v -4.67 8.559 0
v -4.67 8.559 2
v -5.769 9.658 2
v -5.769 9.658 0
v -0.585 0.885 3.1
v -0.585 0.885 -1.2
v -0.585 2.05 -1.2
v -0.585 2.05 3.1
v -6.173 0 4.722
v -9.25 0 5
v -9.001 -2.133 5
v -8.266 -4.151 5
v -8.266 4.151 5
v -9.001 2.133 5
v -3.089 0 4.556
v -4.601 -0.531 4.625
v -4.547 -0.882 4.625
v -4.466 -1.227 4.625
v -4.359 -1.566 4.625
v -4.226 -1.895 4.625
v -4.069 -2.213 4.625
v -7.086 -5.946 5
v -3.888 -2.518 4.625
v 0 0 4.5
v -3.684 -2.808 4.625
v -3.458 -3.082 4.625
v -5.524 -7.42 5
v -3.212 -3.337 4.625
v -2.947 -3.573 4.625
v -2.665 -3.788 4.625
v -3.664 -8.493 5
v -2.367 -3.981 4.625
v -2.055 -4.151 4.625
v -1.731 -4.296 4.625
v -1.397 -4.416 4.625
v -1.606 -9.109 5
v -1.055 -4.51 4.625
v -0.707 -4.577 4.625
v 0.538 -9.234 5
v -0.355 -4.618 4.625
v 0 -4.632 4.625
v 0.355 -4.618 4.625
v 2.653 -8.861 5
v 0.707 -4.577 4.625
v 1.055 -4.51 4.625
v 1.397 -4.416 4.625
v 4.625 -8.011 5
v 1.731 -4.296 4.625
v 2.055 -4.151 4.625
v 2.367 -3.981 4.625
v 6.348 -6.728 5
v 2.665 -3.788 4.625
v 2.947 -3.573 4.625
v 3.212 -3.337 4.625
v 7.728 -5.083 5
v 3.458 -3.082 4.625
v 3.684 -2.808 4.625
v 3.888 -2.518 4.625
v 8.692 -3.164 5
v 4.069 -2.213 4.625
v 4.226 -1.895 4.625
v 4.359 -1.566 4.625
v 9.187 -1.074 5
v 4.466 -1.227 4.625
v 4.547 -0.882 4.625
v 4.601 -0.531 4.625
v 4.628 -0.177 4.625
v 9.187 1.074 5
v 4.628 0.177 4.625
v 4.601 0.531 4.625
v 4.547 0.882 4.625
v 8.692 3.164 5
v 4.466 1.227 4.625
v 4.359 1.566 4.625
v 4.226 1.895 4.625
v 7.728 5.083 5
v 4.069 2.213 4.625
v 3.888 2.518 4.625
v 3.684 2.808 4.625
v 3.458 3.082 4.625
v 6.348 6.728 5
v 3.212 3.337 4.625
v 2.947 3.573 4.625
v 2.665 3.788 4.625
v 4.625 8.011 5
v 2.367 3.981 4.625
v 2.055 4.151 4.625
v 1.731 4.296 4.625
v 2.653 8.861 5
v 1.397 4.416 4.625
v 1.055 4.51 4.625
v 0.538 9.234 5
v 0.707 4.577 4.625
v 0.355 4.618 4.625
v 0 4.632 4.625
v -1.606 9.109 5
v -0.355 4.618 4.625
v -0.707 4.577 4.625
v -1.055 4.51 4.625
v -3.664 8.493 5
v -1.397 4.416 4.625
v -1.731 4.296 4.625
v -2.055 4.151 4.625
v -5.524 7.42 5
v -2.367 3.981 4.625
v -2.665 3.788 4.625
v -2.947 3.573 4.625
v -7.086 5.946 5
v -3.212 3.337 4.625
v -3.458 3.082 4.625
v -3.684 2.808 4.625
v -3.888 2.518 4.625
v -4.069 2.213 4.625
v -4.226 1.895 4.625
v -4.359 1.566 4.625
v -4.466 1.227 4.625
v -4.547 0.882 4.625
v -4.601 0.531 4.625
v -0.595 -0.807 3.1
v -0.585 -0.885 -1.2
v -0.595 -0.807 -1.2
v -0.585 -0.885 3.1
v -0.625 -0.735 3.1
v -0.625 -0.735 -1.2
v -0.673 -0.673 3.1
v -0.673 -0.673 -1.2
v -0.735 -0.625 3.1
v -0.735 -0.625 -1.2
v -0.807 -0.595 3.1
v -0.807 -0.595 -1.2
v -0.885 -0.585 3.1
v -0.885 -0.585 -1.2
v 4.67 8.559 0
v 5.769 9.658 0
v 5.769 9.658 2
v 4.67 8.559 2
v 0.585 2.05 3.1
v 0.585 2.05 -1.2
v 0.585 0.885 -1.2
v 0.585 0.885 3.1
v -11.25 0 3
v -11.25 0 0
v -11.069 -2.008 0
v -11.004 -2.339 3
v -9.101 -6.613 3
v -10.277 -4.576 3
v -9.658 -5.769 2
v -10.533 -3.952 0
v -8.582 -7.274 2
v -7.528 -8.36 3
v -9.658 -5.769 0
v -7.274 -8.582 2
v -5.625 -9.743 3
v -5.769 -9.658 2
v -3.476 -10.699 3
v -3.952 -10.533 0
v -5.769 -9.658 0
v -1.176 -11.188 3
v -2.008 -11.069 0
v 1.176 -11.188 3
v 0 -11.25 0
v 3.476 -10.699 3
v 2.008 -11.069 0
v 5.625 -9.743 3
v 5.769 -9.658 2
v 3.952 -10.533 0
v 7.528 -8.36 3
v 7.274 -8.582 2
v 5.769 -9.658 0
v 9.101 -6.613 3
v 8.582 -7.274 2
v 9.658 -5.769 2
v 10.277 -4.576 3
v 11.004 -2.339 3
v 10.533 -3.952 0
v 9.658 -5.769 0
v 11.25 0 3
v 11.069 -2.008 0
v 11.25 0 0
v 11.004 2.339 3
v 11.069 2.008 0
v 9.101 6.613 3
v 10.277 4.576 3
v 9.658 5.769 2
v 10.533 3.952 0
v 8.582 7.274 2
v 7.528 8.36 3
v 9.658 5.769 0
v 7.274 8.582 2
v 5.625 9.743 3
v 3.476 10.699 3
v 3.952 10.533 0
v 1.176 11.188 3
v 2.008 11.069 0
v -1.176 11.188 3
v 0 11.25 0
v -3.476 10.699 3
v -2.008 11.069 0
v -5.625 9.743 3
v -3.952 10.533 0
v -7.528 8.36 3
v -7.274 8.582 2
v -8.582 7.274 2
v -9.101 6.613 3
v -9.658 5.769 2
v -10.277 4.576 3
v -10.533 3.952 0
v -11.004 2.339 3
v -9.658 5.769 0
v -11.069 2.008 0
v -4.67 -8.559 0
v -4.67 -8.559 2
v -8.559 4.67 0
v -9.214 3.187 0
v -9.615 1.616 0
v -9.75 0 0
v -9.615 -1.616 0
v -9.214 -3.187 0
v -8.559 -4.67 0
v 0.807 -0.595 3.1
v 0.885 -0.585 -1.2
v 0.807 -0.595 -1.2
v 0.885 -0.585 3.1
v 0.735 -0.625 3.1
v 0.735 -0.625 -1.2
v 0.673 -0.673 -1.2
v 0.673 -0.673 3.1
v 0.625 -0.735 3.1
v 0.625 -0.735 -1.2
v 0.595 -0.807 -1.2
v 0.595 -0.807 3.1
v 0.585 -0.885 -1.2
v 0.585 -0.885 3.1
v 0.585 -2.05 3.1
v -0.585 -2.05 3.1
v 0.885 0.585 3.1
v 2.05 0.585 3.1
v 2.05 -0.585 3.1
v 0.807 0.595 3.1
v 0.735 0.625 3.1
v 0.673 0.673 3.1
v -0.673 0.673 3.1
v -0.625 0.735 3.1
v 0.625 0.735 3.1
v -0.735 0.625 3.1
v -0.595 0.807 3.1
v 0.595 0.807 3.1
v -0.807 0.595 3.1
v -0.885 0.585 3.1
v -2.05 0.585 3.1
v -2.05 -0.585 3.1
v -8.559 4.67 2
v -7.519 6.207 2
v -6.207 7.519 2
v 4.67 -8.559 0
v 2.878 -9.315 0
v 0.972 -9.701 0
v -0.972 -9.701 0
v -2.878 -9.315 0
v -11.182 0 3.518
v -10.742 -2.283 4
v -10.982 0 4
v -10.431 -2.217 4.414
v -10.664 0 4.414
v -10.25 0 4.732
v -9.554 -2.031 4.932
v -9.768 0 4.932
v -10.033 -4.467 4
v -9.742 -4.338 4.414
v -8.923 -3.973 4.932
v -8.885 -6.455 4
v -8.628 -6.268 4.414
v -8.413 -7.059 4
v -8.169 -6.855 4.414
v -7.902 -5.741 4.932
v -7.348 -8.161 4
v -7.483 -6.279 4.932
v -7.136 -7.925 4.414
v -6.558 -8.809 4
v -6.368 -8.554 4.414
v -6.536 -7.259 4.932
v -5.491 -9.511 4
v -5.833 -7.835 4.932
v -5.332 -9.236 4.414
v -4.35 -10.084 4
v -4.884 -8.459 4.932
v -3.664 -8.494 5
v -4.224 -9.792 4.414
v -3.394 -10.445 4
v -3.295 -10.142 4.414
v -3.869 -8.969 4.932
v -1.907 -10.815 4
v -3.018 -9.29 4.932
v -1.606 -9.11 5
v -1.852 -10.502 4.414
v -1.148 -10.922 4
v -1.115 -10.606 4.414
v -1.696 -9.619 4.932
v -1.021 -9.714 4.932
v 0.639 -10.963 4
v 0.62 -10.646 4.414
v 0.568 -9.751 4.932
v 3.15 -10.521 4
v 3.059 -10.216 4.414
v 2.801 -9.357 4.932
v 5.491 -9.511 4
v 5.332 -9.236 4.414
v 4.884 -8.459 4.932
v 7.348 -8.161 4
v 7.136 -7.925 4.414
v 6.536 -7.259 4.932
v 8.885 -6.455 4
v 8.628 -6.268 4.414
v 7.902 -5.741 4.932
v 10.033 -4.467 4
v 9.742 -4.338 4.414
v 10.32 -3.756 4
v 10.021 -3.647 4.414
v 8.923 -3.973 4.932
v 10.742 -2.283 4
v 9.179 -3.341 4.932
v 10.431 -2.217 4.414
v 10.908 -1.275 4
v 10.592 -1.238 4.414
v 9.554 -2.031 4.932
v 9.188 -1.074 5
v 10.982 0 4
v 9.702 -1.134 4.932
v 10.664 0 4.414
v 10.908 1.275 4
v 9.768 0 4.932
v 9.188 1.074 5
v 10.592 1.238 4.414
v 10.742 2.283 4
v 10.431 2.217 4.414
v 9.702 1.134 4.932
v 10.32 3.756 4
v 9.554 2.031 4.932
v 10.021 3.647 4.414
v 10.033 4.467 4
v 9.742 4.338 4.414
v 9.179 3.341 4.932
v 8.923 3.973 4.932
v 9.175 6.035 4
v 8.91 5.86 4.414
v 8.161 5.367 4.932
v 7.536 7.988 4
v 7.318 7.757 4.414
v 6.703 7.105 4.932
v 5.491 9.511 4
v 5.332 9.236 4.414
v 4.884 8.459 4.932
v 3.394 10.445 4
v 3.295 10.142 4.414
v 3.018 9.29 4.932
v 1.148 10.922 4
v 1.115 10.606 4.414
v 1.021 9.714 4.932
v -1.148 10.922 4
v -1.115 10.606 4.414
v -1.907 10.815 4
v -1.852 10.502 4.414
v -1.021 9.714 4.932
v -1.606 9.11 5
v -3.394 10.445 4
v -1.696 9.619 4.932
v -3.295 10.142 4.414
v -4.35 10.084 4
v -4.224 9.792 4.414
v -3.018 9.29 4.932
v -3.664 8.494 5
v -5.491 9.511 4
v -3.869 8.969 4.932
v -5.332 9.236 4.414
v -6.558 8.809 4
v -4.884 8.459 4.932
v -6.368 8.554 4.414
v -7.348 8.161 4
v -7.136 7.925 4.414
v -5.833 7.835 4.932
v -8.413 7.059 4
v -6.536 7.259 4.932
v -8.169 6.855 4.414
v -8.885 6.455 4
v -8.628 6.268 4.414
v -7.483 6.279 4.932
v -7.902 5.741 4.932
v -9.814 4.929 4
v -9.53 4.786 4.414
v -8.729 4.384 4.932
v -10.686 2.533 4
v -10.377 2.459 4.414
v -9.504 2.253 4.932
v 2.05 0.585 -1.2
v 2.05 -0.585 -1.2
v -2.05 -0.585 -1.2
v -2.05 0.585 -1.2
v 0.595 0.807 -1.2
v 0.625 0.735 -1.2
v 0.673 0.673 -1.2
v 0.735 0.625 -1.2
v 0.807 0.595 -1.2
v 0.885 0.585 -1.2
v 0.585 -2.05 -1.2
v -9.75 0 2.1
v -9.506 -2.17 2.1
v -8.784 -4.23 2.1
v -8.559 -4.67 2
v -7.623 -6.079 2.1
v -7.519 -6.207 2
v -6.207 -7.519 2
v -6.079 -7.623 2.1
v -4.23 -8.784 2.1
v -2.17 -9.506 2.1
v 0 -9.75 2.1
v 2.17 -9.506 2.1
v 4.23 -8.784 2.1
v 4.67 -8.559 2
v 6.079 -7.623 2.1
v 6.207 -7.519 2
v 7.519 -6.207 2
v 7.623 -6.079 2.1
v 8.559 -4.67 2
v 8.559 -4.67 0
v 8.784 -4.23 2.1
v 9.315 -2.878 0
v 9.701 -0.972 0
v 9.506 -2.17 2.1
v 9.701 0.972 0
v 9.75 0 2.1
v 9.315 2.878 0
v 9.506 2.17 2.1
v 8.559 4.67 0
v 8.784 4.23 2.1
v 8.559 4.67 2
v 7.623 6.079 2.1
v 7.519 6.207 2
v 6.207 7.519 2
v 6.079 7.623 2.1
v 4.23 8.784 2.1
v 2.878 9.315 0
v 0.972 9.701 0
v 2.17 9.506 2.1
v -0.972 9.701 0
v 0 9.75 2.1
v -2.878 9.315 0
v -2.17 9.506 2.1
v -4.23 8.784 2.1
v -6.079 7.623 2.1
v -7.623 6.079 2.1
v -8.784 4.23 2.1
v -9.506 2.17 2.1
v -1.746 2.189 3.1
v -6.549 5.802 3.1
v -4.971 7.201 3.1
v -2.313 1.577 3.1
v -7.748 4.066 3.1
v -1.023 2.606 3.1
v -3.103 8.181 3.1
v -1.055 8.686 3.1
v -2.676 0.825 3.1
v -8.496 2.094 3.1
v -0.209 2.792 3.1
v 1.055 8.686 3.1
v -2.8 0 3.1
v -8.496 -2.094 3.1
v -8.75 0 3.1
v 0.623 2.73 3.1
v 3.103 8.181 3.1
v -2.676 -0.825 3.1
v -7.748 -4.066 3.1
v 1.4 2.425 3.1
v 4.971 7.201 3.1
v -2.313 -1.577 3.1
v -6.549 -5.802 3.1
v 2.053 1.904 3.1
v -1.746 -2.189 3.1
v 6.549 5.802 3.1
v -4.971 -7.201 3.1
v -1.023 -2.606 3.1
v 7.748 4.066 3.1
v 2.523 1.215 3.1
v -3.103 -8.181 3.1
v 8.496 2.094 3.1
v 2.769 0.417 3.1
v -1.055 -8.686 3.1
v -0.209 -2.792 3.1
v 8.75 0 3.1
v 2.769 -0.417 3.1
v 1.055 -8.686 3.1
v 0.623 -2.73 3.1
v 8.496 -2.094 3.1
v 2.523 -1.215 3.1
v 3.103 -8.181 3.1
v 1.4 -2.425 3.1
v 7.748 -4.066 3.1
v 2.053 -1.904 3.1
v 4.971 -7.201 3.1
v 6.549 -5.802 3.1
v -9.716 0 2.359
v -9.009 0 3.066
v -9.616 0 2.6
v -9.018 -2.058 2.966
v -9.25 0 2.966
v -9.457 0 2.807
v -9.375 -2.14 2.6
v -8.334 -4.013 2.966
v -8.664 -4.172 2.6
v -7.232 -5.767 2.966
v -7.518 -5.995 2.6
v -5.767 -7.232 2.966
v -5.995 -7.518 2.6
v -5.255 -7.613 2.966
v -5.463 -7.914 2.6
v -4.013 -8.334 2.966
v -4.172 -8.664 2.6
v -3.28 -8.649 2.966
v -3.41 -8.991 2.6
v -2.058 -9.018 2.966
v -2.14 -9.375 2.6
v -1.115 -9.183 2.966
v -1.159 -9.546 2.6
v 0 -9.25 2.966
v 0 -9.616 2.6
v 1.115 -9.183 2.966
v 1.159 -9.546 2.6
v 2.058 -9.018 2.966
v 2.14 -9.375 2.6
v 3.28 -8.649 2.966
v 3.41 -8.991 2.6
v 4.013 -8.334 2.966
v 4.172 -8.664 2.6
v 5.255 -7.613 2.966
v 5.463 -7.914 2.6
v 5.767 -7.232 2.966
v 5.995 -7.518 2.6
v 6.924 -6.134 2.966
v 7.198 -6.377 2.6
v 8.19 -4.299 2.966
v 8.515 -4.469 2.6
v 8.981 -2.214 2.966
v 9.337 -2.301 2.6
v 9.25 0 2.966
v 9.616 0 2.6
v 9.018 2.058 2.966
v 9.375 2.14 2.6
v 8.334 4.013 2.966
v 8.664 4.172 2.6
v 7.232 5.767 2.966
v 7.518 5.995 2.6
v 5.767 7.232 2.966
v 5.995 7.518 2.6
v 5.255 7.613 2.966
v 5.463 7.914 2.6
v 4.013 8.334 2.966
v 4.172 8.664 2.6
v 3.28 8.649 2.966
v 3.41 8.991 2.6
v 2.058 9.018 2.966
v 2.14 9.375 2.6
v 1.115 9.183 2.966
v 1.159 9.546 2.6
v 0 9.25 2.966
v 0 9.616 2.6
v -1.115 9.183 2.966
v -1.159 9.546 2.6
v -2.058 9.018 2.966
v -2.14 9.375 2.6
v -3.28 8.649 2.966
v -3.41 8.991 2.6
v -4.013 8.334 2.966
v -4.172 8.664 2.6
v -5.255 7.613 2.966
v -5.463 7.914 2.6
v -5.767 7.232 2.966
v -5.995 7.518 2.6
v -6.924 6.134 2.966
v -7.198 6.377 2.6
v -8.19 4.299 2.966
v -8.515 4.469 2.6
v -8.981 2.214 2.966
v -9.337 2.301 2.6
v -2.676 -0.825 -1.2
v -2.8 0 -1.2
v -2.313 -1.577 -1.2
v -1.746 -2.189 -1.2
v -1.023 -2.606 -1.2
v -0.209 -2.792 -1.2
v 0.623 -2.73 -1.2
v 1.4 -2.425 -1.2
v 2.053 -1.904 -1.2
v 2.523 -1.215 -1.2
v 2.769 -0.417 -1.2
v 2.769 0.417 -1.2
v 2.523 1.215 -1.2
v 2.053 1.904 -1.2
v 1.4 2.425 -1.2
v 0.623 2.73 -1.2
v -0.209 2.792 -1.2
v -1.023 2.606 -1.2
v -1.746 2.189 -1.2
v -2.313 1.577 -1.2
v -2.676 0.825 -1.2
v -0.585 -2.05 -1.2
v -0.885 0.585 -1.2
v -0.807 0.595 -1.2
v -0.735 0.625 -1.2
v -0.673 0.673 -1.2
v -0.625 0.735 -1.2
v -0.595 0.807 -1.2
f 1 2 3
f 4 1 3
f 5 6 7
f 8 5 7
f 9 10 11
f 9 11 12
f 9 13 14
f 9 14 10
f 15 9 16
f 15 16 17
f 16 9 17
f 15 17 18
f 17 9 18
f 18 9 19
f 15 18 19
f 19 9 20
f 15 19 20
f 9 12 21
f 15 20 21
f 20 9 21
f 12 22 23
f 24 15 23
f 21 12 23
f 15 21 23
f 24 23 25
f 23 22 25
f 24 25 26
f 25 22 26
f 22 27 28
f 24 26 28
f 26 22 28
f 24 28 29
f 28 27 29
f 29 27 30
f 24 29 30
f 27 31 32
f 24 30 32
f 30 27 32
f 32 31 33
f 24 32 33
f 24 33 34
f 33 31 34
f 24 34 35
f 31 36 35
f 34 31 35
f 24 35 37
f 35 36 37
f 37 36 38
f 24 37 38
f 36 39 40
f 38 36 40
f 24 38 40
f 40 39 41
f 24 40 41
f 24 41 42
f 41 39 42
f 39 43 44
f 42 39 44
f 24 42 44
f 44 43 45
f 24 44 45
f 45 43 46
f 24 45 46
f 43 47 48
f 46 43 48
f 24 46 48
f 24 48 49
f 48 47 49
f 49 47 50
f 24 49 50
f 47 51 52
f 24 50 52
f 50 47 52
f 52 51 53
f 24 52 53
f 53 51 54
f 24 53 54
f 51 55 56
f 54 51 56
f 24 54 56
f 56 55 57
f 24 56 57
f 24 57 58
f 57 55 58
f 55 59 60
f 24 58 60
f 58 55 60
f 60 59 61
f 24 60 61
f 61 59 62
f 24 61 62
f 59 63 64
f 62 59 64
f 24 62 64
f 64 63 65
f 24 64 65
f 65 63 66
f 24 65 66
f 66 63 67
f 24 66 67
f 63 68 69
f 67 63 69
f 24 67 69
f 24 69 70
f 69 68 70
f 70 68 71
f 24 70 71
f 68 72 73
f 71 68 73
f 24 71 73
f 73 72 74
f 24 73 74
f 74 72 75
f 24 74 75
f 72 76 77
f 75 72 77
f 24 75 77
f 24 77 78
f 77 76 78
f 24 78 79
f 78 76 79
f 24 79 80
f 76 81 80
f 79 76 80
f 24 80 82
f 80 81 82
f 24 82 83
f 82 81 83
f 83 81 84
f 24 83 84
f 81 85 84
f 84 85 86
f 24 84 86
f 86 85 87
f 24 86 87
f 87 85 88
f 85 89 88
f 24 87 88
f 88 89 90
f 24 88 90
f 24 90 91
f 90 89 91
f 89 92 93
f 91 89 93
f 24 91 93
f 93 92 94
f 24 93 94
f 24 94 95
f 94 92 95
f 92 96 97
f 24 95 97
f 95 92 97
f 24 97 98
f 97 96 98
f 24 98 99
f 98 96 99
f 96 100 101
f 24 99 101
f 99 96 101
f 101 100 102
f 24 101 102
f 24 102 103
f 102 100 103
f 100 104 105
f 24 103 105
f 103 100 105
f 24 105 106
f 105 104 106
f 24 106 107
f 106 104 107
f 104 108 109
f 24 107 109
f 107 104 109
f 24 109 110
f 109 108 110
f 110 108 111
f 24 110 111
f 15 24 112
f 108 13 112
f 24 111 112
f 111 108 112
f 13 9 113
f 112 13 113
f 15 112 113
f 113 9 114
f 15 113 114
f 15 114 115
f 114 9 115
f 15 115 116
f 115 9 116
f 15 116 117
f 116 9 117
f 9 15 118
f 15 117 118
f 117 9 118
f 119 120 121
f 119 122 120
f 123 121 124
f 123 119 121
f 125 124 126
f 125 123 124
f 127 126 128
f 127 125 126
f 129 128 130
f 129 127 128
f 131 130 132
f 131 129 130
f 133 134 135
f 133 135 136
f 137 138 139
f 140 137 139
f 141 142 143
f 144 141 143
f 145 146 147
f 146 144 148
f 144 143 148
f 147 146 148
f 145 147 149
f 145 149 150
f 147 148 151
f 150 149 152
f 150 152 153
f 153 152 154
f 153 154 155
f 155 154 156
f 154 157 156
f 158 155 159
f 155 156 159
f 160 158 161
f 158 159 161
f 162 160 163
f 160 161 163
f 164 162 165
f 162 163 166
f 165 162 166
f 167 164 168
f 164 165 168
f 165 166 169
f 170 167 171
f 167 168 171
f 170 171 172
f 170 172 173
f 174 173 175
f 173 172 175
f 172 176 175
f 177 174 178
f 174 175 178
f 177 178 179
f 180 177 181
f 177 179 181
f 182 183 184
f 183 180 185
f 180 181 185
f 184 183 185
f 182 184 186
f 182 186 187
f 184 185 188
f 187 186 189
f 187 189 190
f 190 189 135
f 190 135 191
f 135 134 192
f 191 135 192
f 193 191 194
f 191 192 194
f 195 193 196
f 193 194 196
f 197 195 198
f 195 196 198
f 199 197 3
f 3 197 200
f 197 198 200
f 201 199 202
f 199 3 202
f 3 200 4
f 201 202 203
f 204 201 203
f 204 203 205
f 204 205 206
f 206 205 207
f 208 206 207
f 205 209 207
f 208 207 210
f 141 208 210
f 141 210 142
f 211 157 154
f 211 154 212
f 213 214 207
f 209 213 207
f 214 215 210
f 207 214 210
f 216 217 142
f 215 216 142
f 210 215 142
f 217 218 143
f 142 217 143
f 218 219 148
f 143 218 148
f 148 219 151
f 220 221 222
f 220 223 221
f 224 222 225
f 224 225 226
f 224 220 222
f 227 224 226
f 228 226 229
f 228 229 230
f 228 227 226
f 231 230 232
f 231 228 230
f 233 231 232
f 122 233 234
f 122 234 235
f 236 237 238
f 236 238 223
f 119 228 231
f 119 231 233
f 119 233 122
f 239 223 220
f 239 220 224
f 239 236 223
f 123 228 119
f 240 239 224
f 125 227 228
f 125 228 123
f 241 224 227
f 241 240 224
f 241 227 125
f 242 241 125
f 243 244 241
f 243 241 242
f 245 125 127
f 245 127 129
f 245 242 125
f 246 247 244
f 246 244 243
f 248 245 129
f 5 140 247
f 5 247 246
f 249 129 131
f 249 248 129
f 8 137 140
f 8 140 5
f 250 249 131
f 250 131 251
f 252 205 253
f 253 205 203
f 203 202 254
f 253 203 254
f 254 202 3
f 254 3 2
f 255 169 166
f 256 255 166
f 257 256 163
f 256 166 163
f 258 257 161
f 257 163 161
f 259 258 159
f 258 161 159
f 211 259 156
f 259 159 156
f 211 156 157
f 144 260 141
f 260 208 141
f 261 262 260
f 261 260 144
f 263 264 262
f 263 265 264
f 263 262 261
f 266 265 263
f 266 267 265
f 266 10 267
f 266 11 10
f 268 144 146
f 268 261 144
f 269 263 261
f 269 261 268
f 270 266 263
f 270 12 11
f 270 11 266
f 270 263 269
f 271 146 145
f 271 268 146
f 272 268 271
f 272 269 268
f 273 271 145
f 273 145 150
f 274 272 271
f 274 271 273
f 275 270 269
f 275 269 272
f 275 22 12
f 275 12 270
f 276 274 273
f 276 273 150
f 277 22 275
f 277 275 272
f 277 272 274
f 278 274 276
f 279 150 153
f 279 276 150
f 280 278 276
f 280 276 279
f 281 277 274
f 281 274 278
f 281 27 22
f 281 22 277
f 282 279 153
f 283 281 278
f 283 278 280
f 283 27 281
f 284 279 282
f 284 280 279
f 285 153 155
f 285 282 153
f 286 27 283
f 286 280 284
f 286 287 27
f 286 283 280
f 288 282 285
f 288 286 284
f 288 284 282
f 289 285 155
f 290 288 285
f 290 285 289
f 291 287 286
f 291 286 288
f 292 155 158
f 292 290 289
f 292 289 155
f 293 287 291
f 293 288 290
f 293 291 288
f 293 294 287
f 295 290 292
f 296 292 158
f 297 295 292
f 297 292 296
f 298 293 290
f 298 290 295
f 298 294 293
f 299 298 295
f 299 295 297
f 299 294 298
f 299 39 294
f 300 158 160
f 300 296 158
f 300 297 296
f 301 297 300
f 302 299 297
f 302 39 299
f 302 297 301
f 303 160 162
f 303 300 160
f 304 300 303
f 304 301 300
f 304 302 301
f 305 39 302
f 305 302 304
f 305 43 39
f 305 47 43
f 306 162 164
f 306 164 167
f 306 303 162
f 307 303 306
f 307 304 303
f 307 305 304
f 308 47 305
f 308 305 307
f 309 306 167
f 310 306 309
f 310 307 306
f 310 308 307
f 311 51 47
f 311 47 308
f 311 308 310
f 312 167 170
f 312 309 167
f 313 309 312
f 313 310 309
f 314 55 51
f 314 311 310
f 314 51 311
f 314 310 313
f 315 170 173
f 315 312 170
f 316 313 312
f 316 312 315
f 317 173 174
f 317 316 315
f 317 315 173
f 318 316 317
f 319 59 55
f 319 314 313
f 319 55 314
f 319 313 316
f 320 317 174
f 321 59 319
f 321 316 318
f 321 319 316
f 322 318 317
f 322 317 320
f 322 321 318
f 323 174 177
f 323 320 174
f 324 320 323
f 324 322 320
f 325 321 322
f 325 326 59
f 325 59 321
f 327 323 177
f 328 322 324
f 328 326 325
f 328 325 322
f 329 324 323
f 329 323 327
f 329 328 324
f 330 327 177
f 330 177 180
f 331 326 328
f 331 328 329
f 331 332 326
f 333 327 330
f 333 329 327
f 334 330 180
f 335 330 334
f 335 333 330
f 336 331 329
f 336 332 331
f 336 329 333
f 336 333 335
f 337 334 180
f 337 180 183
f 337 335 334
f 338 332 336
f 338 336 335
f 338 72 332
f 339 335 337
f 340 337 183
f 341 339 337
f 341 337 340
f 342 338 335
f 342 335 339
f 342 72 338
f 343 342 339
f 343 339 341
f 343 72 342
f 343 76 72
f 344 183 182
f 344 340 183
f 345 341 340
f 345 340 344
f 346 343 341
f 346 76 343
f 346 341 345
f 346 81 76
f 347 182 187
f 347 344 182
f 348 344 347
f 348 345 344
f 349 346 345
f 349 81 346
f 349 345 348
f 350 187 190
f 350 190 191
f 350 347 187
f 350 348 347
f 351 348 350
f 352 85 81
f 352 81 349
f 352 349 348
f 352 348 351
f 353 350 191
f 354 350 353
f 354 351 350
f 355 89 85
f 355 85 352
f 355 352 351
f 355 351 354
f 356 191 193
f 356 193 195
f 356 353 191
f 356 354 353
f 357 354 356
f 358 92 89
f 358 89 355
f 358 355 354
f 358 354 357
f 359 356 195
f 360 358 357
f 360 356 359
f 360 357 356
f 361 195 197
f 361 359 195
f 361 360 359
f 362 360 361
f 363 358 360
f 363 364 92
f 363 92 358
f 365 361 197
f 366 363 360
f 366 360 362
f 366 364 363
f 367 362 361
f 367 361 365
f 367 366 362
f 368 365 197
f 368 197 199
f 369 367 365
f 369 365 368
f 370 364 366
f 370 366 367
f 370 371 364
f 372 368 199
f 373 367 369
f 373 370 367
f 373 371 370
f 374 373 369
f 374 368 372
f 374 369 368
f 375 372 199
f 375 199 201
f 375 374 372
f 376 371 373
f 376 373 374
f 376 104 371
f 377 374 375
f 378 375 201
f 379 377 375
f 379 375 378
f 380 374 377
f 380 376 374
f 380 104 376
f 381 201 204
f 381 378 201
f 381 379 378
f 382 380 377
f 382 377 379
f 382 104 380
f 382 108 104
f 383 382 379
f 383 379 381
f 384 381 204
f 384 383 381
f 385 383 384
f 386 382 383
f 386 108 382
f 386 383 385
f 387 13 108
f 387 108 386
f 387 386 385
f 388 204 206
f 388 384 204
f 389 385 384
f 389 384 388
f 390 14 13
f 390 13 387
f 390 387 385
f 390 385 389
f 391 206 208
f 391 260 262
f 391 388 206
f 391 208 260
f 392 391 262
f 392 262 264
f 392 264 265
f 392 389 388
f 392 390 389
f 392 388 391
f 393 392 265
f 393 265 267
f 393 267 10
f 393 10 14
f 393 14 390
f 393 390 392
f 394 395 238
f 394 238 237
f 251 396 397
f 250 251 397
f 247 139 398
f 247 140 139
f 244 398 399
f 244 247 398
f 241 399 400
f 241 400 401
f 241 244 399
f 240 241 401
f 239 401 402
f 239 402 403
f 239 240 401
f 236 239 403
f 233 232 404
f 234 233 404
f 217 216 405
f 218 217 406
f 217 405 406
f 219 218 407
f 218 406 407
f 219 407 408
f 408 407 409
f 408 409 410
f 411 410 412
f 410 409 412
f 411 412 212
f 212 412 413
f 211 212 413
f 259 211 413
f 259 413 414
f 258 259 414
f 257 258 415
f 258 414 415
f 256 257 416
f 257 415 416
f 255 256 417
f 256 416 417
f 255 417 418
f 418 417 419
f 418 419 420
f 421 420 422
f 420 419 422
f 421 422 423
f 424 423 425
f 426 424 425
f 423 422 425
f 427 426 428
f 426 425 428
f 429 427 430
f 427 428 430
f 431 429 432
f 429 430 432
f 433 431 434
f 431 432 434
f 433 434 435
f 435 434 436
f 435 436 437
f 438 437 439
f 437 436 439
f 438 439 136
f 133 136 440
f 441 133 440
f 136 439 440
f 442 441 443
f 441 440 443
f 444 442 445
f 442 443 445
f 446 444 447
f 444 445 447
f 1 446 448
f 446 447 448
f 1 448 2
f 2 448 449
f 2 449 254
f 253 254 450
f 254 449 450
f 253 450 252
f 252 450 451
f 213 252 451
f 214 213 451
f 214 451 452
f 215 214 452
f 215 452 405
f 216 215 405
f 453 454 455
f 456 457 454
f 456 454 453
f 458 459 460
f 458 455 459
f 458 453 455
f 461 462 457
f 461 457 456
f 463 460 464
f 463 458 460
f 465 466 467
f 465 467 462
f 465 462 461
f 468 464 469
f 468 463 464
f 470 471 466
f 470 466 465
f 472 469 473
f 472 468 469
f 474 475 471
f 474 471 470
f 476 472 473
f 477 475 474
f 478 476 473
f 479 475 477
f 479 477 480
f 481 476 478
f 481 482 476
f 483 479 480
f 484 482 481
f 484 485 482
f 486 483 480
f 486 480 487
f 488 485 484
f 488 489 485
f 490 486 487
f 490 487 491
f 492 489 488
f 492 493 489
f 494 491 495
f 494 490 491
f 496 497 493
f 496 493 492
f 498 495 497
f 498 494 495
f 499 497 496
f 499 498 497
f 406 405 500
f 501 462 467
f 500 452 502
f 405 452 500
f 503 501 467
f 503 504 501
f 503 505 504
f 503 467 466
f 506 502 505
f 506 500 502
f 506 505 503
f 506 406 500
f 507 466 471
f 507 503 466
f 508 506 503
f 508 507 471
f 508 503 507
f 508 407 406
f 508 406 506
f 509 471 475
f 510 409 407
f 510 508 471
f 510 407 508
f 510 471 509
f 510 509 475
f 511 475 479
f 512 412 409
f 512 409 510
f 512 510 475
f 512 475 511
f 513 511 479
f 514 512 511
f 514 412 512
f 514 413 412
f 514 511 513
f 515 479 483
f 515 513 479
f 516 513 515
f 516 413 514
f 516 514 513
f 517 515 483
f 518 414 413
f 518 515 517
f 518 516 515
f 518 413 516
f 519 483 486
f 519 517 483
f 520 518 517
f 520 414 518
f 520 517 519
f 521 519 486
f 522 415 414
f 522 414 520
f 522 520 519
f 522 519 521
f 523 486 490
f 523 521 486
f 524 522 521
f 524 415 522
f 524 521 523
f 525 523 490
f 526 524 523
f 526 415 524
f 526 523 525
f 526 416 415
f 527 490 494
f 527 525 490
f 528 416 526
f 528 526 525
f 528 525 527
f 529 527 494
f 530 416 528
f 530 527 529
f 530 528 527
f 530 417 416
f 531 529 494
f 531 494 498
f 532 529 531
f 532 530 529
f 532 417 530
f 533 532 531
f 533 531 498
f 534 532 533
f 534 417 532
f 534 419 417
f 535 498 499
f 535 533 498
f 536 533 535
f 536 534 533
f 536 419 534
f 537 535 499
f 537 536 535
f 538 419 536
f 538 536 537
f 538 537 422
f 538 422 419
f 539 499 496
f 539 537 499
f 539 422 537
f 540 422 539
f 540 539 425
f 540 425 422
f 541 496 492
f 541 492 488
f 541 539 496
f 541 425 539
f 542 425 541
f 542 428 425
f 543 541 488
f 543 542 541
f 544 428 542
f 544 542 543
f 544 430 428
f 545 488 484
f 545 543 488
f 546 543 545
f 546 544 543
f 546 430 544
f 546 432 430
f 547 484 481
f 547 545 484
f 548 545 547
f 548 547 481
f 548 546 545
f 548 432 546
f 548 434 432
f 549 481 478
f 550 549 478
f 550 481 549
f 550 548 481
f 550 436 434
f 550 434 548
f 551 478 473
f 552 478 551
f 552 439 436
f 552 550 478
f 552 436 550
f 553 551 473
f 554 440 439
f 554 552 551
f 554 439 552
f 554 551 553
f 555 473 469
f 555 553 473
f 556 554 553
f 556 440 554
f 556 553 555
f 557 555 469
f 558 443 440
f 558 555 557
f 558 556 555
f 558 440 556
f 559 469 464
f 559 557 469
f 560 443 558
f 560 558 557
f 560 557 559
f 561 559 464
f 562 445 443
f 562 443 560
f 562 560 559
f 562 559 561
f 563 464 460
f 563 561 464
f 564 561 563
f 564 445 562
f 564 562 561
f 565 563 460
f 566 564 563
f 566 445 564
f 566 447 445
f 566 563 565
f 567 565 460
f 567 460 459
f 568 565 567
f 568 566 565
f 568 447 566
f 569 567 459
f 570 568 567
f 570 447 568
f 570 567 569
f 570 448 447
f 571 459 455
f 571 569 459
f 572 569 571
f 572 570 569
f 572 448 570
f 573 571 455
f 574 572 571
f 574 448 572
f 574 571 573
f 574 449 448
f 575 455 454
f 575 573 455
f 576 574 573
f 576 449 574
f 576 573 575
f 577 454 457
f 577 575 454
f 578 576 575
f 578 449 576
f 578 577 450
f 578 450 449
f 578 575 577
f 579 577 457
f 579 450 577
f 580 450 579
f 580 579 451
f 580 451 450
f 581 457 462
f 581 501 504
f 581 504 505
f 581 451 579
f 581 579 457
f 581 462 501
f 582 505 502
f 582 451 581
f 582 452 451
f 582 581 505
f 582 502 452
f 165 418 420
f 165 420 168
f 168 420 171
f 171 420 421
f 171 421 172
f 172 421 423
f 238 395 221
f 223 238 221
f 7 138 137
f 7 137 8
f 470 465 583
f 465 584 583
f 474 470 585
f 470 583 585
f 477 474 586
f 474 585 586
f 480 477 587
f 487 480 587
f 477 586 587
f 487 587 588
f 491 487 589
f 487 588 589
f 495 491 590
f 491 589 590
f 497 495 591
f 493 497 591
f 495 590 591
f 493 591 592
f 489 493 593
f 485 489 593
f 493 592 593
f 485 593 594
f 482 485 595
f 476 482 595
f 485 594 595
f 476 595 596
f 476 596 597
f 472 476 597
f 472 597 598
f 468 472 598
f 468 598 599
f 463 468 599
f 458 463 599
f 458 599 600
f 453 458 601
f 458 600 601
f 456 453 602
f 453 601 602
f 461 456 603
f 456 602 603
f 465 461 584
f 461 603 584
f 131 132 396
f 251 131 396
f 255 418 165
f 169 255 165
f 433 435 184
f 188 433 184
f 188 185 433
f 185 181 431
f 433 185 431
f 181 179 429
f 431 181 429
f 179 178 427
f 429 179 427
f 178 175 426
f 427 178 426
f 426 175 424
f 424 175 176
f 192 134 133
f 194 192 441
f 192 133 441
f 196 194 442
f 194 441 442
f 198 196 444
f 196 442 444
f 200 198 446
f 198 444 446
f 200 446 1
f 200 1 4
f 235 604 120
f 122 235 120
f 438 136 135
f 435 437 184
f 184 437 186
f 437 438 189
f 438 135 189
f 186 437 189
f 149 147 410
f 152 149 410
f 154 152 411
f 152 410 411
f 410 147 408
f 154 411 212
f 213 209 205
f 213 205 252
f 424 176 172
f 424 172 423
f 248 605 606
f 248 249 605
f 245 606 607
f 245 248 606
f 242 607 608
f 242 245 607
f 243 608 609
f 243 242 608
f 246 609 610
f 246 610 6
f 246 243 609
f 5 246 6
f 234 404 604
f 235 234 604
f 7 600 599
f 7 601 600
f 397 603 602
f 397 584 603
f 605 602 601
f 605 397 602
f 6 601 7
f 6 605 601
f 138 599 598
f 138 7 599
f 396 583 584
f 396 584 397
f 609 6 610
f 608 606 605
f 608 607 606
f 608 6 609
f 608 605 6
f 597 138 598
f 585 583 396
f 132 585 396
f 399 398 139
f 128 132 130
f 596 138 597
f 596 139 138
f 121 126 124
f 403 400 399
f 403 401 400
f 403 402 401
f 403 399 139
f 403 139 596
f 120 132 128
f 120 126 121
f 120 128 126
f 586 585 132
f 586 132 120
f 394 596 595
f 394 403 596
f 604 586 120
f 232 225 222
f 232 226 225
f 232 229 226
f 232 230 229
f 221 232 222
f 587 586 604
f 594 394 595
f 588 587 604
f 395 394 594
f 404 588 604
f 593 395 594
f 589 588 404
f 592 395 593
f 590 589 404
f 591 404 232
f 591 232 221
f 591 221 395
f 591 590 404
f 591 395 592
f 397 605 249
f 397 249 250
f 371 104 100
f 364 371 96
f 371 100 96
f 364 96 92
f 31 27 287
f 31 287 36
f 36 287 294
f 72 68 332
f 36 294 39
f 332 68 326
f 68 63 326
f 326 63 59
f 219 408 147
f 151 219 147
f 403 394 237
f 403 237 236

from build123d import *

# Parameters (mm, degrees)
SKETCH1_W          = 6.95
SKETCH1_H          = 0.5
SKETCH1_W_2        = 2.8
SKETCH1_H_2        = 1.2
CUT_EXTRUDE2_START = 2
CUT_EXTRUDE2_DEPTH = 2
SKETCH3_W          = 1.17
SKETCH3_H          = 1.465
SKETCH3_H_2        = 1.17
SKETCH3_W_2        = 1.465
CUT_EXTRUDE3_DEPTH = 4.3
FILLET1_R          = 0.3
FILLET2_R          = 1
FILLET3_R          = 2


with BuildPart() as part:
    # Sketch1 → Revolve1 (revolve)
    with BuildSketch(Plane(origin=(0, 0, 0), x_dir=(1, 0, 0), z_dir=(0, 1, 0)), mode=Mode.PRIVATE) as revolve1_sk:
        with BuildLine():
            Line((2.8, 0), (0, 0))
            Line((0, 0), (0, -4.5))
            ThreePointArc((0, -4.5), (4.631751828, -4.625091174), (9.25, -5))
            Line((9.25, -5), (11.25, -5))
            Line((11.25, -5), (11.25, 0))
            Line((11.25, 0), (9.75, 0))
            Line((9.75, 0), (9.75, -3.1))
            Line((9.75, -3.1), (9.75, -3.6))
            Line((9.75, -3.6), (2.8, -3.6))
            Line((2.8, -3.6), (2.8, -3.1))
            Line((2.8, -3.1), (2.8, 0))
        make_face()
        with Locations((6.275, -3.35)):
            Rectangle(SKETCH1_W, SKETCH1_H)
        with Locations((1.4, 0.6)):
            Rectangle(SKETCH1_W_2, SKETCH1_H_2)
    revolve(revolve1_sk.sketch.rotate(Axis((0, 0, 0), (0, 0, 1)), 180), axis=Axis((0, 0, 0), (0, 0, 1)))

    # Sketch2 → Cut-Extrude2 (cut)
    with BuildSketch(Plane.XY.offset(CUT_EXTRUDE2_START)):
        with BuildLine():
            Line((8.558921926, 7.350980651), (7.350980651, 8.558921926))
            Line((7.350980651, 8.558921926), (4.669834629, 8.558921926))
            ThreePointArc((4.669834629, 8.558921926), (6.894291117, 6.894291117), (8.558921926, 4.669834629))
            Line((8.558921926, 4.669834629), (8.558921926, 7.350980651))
        make_face()
        Polygon((7.350980651, 8.558921926), (6.01040764, 9.899494937), (4.669834629, 8.558921926), align=None)
        Polygon((9.899494937, 6.01040764), (8.558921926, 7.350980651), (8.558921926, 4.669834629), align=None)
        Polygon((9.899494937, -6.01040764), (8.558921926, -4.669834629), (8.558921926, -7.350980651), align=None)
        with BuildLine():
            Line((8.558921926, -7.350980651), (8.558921926, -4.669834629))
            ThreePointArc((8.558921926, -4.669834629), (6.894291117, -6.894291117), (4.669834629, -8.558921926))
            Line((4.669834629, -8.558921926), (7.350980651, -8.558921926))
            Line((7.350980651, -8.558921926), (8.558921926, -7.350980651))
        make_face()
        Polygon((7.350980651, -8.558921926), (4.669834629, -8.558921926), (6.01040764, -9.899494937), align=None)
        Polygon((-6.01040764, -9.899494937), (-4.669834629, -8.558921926), (-7.350980651, -8.558921926), align=None)
        with BuildLine():
            ThreePointArc((-4.669834629, -8.558921926), (-6.894291117, -6.894291117), (-8.558921926, -4.669834629))
            Line((-8.558921926, -4.669834629), (-8.558921926, -7.350980651))
            Line((-8.558921926, -7.350980651), (-7.350980651, -8.558921926))
            Line((-7.350980651, -8.558921926), (-4.669834629, -8.558921926))
        make_face()
        Polygon((-8.558921926, -7.350980651), (-8.558921926, -4.669834629), (-9.899494937, -6.01040764), align=None)
        Polygon((-9.899494937, 6.01040764), (-8.558921926, 4.669834629), (-8.558921926, 7.350980651), align=None)
        with BuildLine():
            ThreePointArc((-8.558921926, 4.669834629), (-6.894291117, 6.894291117), (-4.669834629, 8.558921926))
            Line((-4.669834629, 8.558921926), (-7.350980651, 8.558921926))
            Line((-7.350980651, 8.558921926), (-8.558921926, 7.350980651))
            Line((-8.558921926, 7.350980651), (-8.558921926, 4.669834629))
        make_face()
        Polygon((-7.350980651, 8.558921926), (-4.669834629, 8.558921926), (-6.01040764, 9.899494937), align=None)
    extrude(amount=-CUT_EXTRUDE2_DEPTH, mode=Mode.SUBTRACT)

    # Sketch3 → Cut-Extrude3 (cut)
    with BuildSketch(Plane(origin=(0, 0, -1.2), x_dir=(-1, 0, 0), z_dir=(0, 0, -1))):
        with Locations((0, 1.3175)):
            Rectangle(SKETCH3_W, SKETCH3_H)
        Rectangle(SKETCH3_W, SKETCH3_H_2)
        with Locations((0, -1.3175)):
            Rectangle(SKETCH3_W, SKETCH3_H)
        with Locations((-1.3175, 0)):
            Rectangle(SKETCH3_W_2, SKETCH3_H_2)
        with Locations((1.3175, 0)):
            Rectangle(SKETCH3_W_2, SKETCH3_H_2)
    extrude(amount=-CUT_EXTRUDE3_DEPTH, mode=Mode.SUBTRACT)

    # Fillet1
    fillet1_edges = [part.edges().sort_by_distance(p)[0] for p in [
        (0.585, 0.585, 0.95),
        (0.585, -0.585, 0.95),
        (-0.585, -0.585, 0.95),
        (-0.585, 0.585, 0.95),
    ]]
    fillet(fillet1_edges, radius=FILLET1_R)

    # Fillet2
    fillet2_edges = [part.edges().sort_by_distance(p)[0] for p in [
        (9.75, 0, 3.1),
    ]]
    fillet(fillet2_edges, radius=FILLET2_R)

    # Fillet3
    fillet3_edges = [part.edges().sort_by_distance(p)[0] for p in [
        (11.25, 0, 5),
    ]]
    fillet(fillet3_edges, radius=FILLET3_R - 0.0001)  # a hair under: the kernel refuses the full size


solid = part.part
